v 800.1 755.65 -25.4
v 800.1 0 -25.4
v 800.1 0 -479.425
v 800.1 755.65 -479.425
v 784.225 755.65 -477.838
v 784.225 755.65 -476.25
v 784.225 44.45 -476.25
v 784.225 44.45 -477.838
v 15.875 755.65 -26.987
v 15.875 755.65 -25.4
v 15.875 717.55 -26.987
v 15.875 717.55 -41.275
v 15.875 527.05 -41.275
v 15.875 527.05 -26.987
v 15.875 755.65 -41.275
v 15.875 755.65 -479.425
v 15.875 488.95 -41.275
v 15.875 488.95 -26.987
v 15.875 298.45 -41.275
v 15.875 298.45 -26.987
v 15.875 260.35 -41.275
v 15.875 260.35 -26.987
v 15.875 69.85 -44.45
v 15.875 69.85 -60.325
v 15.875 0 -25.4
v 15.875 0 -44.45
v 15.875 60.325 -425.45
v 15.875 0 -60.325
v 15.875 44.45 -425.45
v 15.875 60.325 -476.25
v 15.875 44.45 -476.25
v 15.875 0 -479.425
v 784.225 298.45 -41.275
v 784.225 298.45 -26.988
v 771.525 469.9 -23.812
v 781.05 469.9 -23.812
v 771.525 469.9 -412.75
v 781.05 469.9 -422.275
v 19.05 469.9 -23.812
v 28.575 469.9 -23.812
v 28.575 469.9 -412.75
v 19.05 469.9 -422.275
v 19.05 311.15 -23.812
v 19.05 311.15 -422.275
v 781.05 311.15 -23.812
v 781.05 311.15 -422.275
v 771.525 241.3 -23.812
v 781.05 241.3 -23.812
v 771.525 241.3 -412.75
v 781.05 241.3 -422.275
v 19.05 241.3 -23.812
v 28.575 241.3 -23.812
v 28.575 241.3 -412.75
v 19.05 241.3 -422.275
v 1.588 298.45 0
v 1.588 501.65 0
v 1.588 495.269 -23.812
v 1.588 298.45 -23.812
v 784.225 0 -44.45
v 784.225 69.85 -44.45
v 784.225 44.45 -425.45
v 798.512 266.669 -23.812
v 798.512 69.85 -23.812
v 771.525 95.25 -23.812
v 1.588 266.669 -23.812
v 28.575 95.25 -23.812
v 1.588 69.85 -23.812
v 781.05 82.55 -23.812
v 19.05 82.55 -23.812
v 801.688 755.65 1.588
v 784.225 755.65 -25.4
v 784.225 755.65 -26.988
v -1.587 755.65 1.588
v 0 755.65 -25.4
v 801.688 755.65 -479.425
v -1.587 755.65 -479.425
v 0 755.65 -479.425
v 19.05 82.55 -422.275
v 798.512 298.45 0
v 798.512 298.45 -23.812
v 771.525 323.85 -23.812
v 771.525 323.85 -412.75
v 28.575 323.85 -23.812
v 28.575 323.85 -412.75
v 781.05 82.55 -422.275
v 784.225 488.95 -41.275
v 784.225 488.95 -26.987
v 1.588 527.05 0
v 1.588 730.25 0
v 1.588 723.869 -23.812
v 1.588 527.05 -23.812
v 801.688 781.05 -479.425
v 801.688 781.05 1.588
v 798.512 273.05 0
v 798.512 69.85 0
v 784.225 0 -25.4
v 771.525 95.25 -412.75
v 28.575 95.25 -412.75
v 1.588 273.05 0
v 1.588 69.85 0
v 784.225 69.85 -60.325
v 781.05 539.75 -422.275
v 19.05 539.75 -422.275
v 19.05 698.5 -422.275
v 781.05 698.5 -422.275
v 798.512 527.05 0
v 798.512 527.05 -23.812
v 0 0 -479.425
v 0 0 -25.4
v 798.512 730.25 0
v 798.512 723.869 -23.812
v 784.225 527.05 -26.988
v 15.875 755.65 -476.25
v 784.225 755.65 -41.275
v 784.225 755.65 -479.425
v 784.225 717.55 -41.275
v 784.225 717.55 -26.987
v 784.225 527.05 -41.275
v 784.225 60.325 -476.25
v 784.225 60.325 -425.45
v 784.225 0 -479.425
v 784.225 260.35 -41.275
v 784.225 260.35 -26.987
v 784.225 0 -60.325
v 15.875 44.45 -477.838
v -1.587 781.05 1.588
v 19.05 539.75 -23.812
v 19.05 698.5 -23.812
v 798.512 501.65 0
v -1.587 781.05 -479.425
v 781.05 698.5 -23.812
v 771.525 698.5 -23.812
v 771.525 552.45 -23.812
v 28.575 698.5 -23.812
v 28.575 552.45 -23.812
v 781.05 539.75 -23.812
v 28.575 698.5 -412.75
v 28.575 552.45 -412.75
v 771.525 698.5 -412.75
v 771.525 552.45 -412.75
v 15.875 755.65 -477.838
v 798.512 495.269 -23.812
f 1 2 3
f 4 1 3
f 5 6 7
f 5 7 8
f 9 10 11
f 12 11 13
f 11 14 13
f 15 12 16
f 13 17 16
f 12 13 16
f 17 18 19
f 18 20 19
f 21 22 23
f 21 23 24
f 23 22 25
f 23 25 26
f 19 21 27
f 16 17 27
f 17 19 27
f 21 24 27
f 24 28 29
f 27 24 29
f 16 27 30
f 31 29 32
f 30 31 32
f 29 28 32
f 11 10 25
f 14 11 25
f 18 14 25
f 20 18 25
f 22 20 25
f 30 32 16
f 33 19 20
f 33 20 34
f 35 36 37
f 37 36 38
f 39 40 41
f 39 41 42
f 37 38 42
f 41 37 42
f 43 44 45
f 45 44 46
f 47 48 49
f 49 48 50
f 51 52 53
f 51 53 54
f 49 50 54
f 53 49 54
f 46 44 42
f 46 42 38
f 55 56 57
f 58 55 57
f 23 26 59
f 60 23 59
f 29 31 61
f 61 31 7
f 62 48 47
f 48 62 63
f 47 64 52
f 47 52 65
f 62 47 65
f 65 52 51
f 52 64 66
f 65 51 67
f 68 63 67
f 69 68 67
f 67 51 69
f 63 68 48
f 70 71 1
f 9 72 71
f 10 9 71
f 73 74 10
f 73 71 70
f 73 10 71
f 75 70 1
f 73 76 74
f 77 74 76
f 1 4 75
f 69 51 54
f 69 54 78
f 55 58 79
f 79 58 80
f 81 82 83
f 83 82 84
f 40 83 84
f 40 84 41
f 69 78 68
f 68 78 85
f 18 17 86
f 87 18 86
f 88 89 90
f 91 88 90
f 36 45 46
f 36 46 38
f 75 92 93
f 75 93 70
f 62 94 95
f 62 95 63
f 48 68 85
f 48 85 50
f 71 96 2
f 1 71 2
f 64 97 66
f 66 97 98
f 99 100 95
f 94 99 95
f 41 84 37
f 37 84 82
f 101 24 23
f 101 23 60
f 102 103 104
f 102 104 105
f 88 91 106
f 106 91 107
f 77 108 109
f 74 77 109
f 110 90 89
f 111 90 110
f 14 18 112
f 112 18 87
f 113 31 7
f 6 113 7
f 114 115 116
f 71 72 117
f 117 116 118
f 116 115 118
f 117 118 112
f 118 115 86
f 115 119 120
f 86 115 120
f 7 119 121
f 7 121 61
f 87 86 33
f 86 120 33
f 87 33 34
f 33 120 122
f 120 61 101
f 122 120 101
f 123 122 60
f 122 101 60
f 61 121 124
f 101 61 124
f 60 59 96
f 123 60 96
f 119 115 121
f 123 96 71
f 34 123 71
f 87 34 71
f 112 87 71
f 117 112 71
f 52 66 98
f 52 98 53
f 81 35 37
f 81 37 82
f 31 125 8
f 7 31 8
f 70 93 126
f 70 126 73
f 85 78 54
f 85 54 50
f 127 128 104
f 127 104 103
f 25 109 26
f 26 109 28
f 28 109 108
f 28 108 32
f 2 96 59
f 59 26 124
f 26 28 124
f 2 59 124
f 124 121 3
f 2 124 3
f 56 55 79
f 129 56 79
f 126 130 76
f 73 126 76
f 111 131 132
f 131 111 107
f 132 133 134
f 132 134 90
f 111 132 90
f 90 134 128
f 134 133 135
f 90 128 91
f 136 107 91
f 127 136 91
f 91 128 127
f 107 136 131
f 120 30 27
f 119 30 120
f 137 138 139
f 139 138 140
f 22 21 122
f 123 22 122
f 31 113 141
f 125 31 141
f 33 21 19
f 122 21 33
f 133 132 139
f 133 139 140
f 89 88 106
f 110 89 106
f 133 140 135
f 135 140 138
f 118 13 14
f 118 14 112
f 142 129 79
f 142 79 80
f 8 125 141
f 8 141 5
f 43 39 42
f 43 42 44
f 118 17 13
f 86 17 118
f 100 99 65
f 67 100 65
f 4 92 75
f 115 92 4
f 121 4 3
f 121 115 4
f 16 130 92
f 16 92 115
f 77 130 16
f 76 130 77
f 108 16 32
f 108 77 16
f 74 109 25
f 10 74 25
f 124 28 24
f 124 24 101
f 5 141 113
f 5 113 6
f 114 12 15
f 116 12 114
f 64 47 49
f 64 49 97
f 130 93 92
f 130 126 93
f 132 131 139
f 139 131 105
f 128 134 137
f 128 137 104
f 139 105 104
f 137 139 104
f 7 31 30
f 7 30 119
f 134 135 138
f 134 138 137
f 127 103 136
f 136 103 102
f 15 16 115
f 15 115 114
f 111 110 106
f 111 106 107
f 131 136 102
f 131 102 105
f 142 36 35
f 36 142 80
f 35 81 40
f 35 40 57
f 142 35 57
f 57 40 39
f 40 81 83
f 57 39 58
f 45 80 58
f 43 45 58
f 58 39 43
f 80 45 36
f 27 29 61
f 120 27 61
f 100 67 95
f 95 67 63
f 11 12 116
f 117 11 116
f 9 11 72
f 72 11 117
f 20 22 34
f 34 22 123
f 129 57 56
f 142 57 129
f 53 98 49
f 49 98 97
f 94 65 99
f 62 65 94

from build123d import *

# Parameters (mm, degrees)
BASESECTIONSIDESBOSS_EXTRUDE_DEPTH       = 69.85
BASESECTIONSIDESBOSS_EXTRUDE_2_DEPTH     = 69.85
PLANSKETCH_3_W                           = 768.35
PLANSKETCH_3_H                           = 15.875
BASEFACEEXTRUDE_THIN_DEPTH               = 69.85
F_1STLEVSIDESSECTIONBOSS_EXTRUDE_START   = 69.85
F_1STLEVSIDESSECTIONBOSS_EXTRUDE_DEPTH   = 228.6
F_1STLEVSIDESSECTIONBOSS_EXTRUDE_2_DEPTH = 228.6
F_1STLEVFRONTBAREXTRUDE_THIN_START       = 260.35
PLANSKETCH_5_W                           = 800.1
PLANSKETCH_5_H                           = 15.875
F_1STLEVFRONTBAREXTRUDE_THIN_DEPTH       = 38.1
DRAWERFACEBOSS_EXTRUDE_START             = 69.85
PLANSKETCH_6_W                           = 768.35
PLANSKETCH_6_H                           = 25.4
PLANSKETCH_6_W_2                         = 15.875
DRAWERFACEBOSS_EXTRUDE_DEPTH             = 203.2
POSITIONINGMOVE_FACE_BY                  = 1.5875
POSITIONINGMOVE_FACE_2_BY                = 1.5875
POSITIONINGMOVE_FACE_3_BY                = 1.5875
POSITIONINGMOVE_FACE_4_BY                = 1.5875
DRAWERPULLTOPMOVE_START                  = 263.746046868
DRAWERPULLTOPMOVE_FACE_OUTLINE_W         = 800
DRAWERPULLTOPMOVE_FACE_OUTLINE_H         = 27
DRAWERPULLTOPMOVE_FACE_DEPTH             = 6.163128512
BASEBACKBEAMBOSS_EXTRUDE_START           = 44.45
PLANSKETCH_8_W                           = 768.35
PLANSKETCH_8_H                           = 50.8
BASEBACKBEAMBOSS_EXTRUDE_DEPTH           = 15.875
DRAWERBODYBOSS_EXTRUDE_START             = 82.55
PLANSKETCH_9_W                           = 768.35
PLANSKETCH_9_H                           = 381
PLANSKETCH_9_H_2                         = 19.05
DRAWERBODYBOSS_EXTRUDE_DEPTH             = 158.75
DRAWERBODYSHELL_T                        = -12.7
DRAWERSIDESMOVE_FACE_BY                  = 3.175
DRAWERSIDESMOVE_FACE_2_BY                = 3.175
DRAWERSIDESMOVE_FACE_3_BY                = 3.175
DRAWERMERGEMOVE_START                    = -25.4
DRAWERMERGEMOVE_FACE_DEPTH               = 12.7
HEIGHTLPATTERN_COUNT                     = 3
HEIGHTLPATTERN_PITCH                     = 228.6
TOPBOARDBOSS_EXTRUDE_START               = 781.05
PLANSKETCH_10_W                          = 800.1
PLANSKETCH_10_H                          = 479.425
TOPBOARDBOSS_EXTRUDE_DEPTH               = 25.4
BACKBOARDEXTRUDE_THIN_START              = 44.45
PLANSKETCH_11_W                          = 768.35
PLANSKETCH_11_H                          = 1.5875
BACKBOARDEXTRUDE_THIN_DEPTH              = 711.2
TOPBOARDEXPANDMOVE_FACE_BY               = 1.5875
TOPBOARDEXPANDMOVE_FACE_2_BY             = 1.5875
TOPBOARDEXPANDMOVE_FACE_3_BY             = 1.5875


# Read off the part's stored shape, not the designer's step: DrawerPullTopMove Face, DrawerMergeMove Face
with BuildPart() as part:
    # PlanSketch → BaseSectionSidesBoss-Extrude (new body)
    with BuildSketch(Plane(origin=(0, 0, 0), x_dir=(1, 0, 0), z_dir=(0, 1, 0))):
        Polygon((800.1, 479.425), (784.225, 479.425), (784.225, 476.25), (784.225, 425.45), (784.225, 44.45), (784.225, 25.4), (800.1, 25.4), align=None)
    extrude(amount=BASESECTIONSIDESBOSS_EXTRUDE_DEPTH)



with BuildPart() as body_2:
    # PlanSketch → BaseSectionSidesBoss-Extrude 2 (new body)
    with BuildSketch(Plane(origin=(0, 0, 0), x_dir=(1, 0, 0), z_dir=(0, 1, 0))):
        Polygon((15.875, 476.25), (15.875, 479.425), (0, 479.425), (0, 25.4), (15.875, 25.4), (15.875, 44.45), (15.875, 425.45), align=None)
    extrude(amount=BASESECTIONSIDESBOSS_EXTRUDE_2_DEPTH)


with BuildPart() as part_1:
    add(part.part)

    add(body_2.part)  # BaseFaceExtrude-Thin merges body 2
    # PlanSketch<3> → BaseFaceExtrude-Thin (add)
    with BuildSketch(Plane(origin=(0, 0, 0), x_dir=(1, 0, 0), z_dir=(0, 1, 0))):
        with Locations((400.05, 52.3875)):
            Rectangle(PLANSKETCH_3_W, PLANSKETCH_3_H)
    extrude(amount=BASEFACEEXTRUDE_THIN_DEPTH)

    # PlanSketch<8> → BaseBackBeamBoss-Extrude (add)
    with BuildSketch(Plane(origin=(0, 0, 0), x_dir=(1, 0, 0), z_dir=(0, 1, 0)).offset(BASEBACKBEAMBOSS_EXTRUDE_START)):
        with Locations((400.05, 450.85)):
            Rectangle(PLANSKETCH_8_W, PLANSKETCH_8_H)
    extrude(amount=BASEBACKBEAMBOSS_EXTRUDE_DEPTH)


with BuildPart() as body_2_2:
    # PlanSketch<4> → 1stLevSidesSectionBoss-Extrude (new body)
    with BuildSketch(Plane(origin=(0, 0, 0), x_dir=(1, 0, 0), z_dir=(0, 1, 0)).offset(F_1STLEVSIDESSECTIONBOSS_EXTRUDE_START)):
        Polygon((15.875, 476.25), (15.875, 479.425), (0, 479.425), (0, 25.4), (15.875, 25.4), (15.875, 44.45), (15.875, 425.45), align=None)
    extrude(amount=F_1STLEVSIDESSECTIONBOSS_EXTRUDE_DEPTH)


with BuildPart() as body_3:
    # PlanSketch<4> → 1stLevSidesSectionBoss-Extrude 2 (new body)
    with BuildSketch(Plane(origin=(0, 0, 0), x_dir=(1, 0, 0), z_dir=(0, 1, 0)).offset(F_1STLEVSIDESSECTIONBOSS_EXTRUDE_START)):
        Polygon((800.1, 479.425), (784.225, 479.425), (784.225, 476.25), (784.225, 425.45), (784.225, 44.45), (784.225, 25.4), (800.1, 25.4), align=None)
    extrude(amount=F_1STLEVSIDESSECTIONBOSS_EXTRUDE_2_DEPTH)


with BuildPart() as body_4:
    # PlanSketch<5> → 1stLevFrontBarExtrude-Thin (new body)
    with BuildSketch(Plane(origin=(0, 0, 0), x_dir=(1, 0, 0), z_dir=(0, 1, 0)).offset(F_1STLEVFRONTBAREXTRUDE_THIN_START)):
        with Locations((400.05, 33.3375)):
            Rectangle(PLANSKETCH_5_W, PLANSKETCH_5_H)
    extrude(amount=F_1STLEVFRONTBAREXTRUDE_THIN_DEPTH)

    # PositioningMove Face 4: a face moved inward by 1.5875
    extrude(body_4.faces().sort_by_distance((400.05, 279.4, -25.4))[0], amount=POSITIONINGMOVE_FACE_4_BY, dir=(0, 0, -1), mode=Mode.SUBTRACT)


with BuildPart() as body_5:
    # PlanSketch<6> → DrawerFaceBoss-Extrude (new body)
    with BuildSketch(Plane(origin=(0, 0, 0), x_dir=(1, 0, 0), z_dir=(0, 1, 0)).offset(DRAWERFACEBOSS_EXTRUDE_START)):
        with Locations((400.05, 12.7)):
            Rectangle(PLANSKETCH_6_W, PLANSKETCH_6_H)
        with Locations((792.1625, 12.7)):
            Rectangle(PLANSKETCH_6_W_2, PLANSKETCH_6_H)
        with Locations((7.9375, 12.7)):
            Rectangle(PLANSKETCH_6_W_2, PLANSKETCH_6_H)
    extrude(amount=DRAWERFACEBOSS_EXTRUDE_DEPTH)

    # PositioningMove Face: a face moved inward by 1.5875
    extrude(body_5.faces().sort_by_distance((0, 171.45, -12.7))[0], amount=POSITIONINGMOVE_FACE_BY, dir=(1, 0, 0), mode=Mode.SUBTRACT)

    # PositioningMove Face 2: a face moved inward by 1.5875
    extrude(body_5.faces().sort_by_distance((800.1, 171.45, -12.7))[0], amount=POSITIONINGMOVE_FACE_2_BY, dir=(-1, 0, 0), mode=Mode.SUBTRACT)

    # PositioningMove Face 3: a face moved inward by 1.5875
    extrude(body_5.faces().sort_by_distance((400.05, 171.45, -25.4))[0], amount=POSITIONINGMOVE_FACE_3_BY, dir=(0, 0, 1), mode=Mode.SUBTRACT)

    # DrawerPullTopMove Face outline → DrawerPullTopMove Face (cut)
    with BuildSketch(Plane(origin=(0, 0, 0), x_dir=(1, 0, 0), z_dir=(0, 0.9659258262890682, -0.2588190451025211)).offset(DRAWERPULLTOPMOVE_START)):
        with Locations((400, -58.5)):
            Rectangle(DRAWERPULLTOPMOVE_FACE_OUTLINE_W, DRAWERPULLTOPMOVE_FACE_OUTLINE_H)
    extrude(amount=DRAWERPULLTOPMOVE_FACE_DEPTH, mode=Mode.SUBTRACT)


with BuildPart() as body_6:
    # PlanSketch<9> → DrawerBodyBoss-Extrude (new body)
    with BuildSketch(Plane(origin=(0, 0, 0), x_dir=(1, 0, 0), z_dir=(0, 1, 0)).offset(DRAWERBODYBOSS_EXTRUDE_START)):
        with Locations((400.05, 234.95)):
            Rectangle(PLANSKETCH_9_W, PLANSKETCH_9_H)
        with Locations((400.05, 34.925)):
            Rectangle(PLANSKETCH_9_W, PLANSKETCH_9_H_2)
    extrude(amount=DRAWERBODYBOSS_EXTRUDE_DEPTH)

    # DrawerBodyShell
    drawerbodyshell_openings = [body_6.faces().sort_by_distance(p)[0] for p in [
        (400.05, 241.3, -225.425),
        (400.05, 161.925, -25.4),
    ]]
    offset(amount=DRAWERBODYSHELL_T, openings=drawerbodyshell_openings, kind=Kind.INTERSECTION)

    # DrawerSidesMove Face: a face moved inward by 3.175
    extrude(body_6.faces().sort_by_distance((400.05, 161.925, -425.45))[0], amount=DRAWERSIDESMOVE_FACE_BY, dir=(0, 0, 1), mode=Mode.SUBTRACT)

    # DrawerSidesMove Face 2: a face moved inward by 3.175
    extrude(body_6.faces().sort_by_distance((15.875, 161.925, -225.425))[0], amount=DRAWERSIDESMOVE_FACE_2_BY, dir=(1, 0, 0), mode=Mode.SUBTRACT)

    # DrawerSidesMove Face 3: a face moved inward by 3.175
    extrude(body_6.faces().sort_by_distance((784.225, 161.925, -225.425))[0], amount=DRAWERSIDESMOVE_FACE_3_BY, dir=(-1, 0, 0), mode=Mode.SUBTRACT)

    # DrawerMergeMove Face outline → DrawerMergeMove Face (add)
    with BuildSketch(Plane.XY.offset(DRAWERMERGEMOVE_START)):
        Polygon((19.05, 241.3), (19.05, 82.55), (781.05, 82.55), (781.05, 241.3), (771.525, 241.3), (771.525, 95.25), (28.575, 95.25), (28.575, 241.3), align=None)
    extrude(amount=DRAWERMERGEMOVE_FACE_DEPTH)


with BuildPart() as body_3_1:
    add(body_3.part)

    # 1srLevelCombine: union body 4, body 2 2
    add(body_4.part)
    add(body_2_2.part)


with BuildPart() as body_5_1:
    add(body_5.part)

    # DrawerCombine: union body 6
    add(body_6.part)


with BuildPart() as heightlpattern_1:
    # HeightLPattern: pattern copy
    add(body_5_1.part.moved(Location(Vector(0, 1, 0) * (1 * HEIGHTLPATTERN_PITCH))))


with BuildPart() as heightlpattern_2:
    # HeightLPattern: pattern copy
    add(body_5_1.part.moved(Location(Vector(0, 1, 0) * (2 * HEIGHTLPATTERN_PITCH))))


with BuildPart() as heightlpattern_3:
    # HeightLPattern: pattern copy
    add(body_3_1.part.moved(Location(Vector(0, 1, 0) * (1 * HEIGHTLPATTERN_PITCH))))


with BuildPart() as heightlpattern_4:
    # HeightLPattern: pattern copy
    add(body_3_1.part.moved(Location(Vector(0, 1, 0) * (2 * HEIGHTLPATTERN_PITCH))))


with BuildPart() as body_8:
    # PlanSketch<10> → TopBoardBoss-Extrude (new body)
    with BuildSketch(Plane(origin=(0, 0, 0), x_dir=(1, 0, 0), z_dir=(0, 1, 0)).offset(TOPBOARDBOSS_EXTRUDE_START)):
        with Locations((400.05, 239.7125)):
            Rectangle(PLANSKETCH_10_W, PLANSKETCH_10_H)
    extrude(amount=-TOPBOARDBOSS_EXTRUDE_DEPTH)

    # TopBoardExpandMove Face: a face moved outward by 1.5875
    extrude(body_8.faces().sort_by_distance((400.05, 768.35, 0))[0], amount=TOPBOARDEXPANDMOVE_FACE_BY, dir=(0, 0, 1))

    # TopBoardExpandMove Face 2: a face moved outward by 1.5875
    extrude(body_8.faces().sort_by_distance((0, 768.35, -239.7125))[0], amount=TOPBOARDEXPANDMOVE_FACE_2_BY, dir=(-1, 0, 0))

    # TopBoardExpandMove Face 3: a face moved outward by 1.5875
    extrude(body_8.faces().sort_by_distance((800.1, 768.35, -239.7125))[0], amount=TOPBOARDEXPANDMOVE_FACE_3_BY, dir=(1, 0, 0))


with BuildPart() as body_9:
    # PlanSketch<11> → BackBoardExtrude-Thin (new body)
    with BuildSketch(Plane(origin=(0, 0, 0), x_dir=(1, 0, 0), z_dir=(0, 1, 0)).offset(BACKBOARDEXTRUDE_THIN_START)):
        with Locations((400.05, 477.04375)):
            Rectangle(PLANSKETCH_11_W, PLANSKETCH_11_H)
    extrude(amount=BACKBOARDEXTRUDE_THIN_DEPTH)


with BuildPart() as heightlpattern_4_1:
    add(heightlpattern_4.part)

    # 2W3HCombine: union HeightLPattern_3, body 3, part, body 8
    add(heightlpattern_3.part)
    add(body_3_1.part)
    add(part_1.part)
    add(body_8.part)


solid = Compound([body_5_1.part, heightlpattern_1.part, heightlpattern_2.part, body_9.part, heightlpattern_4_1.part])
